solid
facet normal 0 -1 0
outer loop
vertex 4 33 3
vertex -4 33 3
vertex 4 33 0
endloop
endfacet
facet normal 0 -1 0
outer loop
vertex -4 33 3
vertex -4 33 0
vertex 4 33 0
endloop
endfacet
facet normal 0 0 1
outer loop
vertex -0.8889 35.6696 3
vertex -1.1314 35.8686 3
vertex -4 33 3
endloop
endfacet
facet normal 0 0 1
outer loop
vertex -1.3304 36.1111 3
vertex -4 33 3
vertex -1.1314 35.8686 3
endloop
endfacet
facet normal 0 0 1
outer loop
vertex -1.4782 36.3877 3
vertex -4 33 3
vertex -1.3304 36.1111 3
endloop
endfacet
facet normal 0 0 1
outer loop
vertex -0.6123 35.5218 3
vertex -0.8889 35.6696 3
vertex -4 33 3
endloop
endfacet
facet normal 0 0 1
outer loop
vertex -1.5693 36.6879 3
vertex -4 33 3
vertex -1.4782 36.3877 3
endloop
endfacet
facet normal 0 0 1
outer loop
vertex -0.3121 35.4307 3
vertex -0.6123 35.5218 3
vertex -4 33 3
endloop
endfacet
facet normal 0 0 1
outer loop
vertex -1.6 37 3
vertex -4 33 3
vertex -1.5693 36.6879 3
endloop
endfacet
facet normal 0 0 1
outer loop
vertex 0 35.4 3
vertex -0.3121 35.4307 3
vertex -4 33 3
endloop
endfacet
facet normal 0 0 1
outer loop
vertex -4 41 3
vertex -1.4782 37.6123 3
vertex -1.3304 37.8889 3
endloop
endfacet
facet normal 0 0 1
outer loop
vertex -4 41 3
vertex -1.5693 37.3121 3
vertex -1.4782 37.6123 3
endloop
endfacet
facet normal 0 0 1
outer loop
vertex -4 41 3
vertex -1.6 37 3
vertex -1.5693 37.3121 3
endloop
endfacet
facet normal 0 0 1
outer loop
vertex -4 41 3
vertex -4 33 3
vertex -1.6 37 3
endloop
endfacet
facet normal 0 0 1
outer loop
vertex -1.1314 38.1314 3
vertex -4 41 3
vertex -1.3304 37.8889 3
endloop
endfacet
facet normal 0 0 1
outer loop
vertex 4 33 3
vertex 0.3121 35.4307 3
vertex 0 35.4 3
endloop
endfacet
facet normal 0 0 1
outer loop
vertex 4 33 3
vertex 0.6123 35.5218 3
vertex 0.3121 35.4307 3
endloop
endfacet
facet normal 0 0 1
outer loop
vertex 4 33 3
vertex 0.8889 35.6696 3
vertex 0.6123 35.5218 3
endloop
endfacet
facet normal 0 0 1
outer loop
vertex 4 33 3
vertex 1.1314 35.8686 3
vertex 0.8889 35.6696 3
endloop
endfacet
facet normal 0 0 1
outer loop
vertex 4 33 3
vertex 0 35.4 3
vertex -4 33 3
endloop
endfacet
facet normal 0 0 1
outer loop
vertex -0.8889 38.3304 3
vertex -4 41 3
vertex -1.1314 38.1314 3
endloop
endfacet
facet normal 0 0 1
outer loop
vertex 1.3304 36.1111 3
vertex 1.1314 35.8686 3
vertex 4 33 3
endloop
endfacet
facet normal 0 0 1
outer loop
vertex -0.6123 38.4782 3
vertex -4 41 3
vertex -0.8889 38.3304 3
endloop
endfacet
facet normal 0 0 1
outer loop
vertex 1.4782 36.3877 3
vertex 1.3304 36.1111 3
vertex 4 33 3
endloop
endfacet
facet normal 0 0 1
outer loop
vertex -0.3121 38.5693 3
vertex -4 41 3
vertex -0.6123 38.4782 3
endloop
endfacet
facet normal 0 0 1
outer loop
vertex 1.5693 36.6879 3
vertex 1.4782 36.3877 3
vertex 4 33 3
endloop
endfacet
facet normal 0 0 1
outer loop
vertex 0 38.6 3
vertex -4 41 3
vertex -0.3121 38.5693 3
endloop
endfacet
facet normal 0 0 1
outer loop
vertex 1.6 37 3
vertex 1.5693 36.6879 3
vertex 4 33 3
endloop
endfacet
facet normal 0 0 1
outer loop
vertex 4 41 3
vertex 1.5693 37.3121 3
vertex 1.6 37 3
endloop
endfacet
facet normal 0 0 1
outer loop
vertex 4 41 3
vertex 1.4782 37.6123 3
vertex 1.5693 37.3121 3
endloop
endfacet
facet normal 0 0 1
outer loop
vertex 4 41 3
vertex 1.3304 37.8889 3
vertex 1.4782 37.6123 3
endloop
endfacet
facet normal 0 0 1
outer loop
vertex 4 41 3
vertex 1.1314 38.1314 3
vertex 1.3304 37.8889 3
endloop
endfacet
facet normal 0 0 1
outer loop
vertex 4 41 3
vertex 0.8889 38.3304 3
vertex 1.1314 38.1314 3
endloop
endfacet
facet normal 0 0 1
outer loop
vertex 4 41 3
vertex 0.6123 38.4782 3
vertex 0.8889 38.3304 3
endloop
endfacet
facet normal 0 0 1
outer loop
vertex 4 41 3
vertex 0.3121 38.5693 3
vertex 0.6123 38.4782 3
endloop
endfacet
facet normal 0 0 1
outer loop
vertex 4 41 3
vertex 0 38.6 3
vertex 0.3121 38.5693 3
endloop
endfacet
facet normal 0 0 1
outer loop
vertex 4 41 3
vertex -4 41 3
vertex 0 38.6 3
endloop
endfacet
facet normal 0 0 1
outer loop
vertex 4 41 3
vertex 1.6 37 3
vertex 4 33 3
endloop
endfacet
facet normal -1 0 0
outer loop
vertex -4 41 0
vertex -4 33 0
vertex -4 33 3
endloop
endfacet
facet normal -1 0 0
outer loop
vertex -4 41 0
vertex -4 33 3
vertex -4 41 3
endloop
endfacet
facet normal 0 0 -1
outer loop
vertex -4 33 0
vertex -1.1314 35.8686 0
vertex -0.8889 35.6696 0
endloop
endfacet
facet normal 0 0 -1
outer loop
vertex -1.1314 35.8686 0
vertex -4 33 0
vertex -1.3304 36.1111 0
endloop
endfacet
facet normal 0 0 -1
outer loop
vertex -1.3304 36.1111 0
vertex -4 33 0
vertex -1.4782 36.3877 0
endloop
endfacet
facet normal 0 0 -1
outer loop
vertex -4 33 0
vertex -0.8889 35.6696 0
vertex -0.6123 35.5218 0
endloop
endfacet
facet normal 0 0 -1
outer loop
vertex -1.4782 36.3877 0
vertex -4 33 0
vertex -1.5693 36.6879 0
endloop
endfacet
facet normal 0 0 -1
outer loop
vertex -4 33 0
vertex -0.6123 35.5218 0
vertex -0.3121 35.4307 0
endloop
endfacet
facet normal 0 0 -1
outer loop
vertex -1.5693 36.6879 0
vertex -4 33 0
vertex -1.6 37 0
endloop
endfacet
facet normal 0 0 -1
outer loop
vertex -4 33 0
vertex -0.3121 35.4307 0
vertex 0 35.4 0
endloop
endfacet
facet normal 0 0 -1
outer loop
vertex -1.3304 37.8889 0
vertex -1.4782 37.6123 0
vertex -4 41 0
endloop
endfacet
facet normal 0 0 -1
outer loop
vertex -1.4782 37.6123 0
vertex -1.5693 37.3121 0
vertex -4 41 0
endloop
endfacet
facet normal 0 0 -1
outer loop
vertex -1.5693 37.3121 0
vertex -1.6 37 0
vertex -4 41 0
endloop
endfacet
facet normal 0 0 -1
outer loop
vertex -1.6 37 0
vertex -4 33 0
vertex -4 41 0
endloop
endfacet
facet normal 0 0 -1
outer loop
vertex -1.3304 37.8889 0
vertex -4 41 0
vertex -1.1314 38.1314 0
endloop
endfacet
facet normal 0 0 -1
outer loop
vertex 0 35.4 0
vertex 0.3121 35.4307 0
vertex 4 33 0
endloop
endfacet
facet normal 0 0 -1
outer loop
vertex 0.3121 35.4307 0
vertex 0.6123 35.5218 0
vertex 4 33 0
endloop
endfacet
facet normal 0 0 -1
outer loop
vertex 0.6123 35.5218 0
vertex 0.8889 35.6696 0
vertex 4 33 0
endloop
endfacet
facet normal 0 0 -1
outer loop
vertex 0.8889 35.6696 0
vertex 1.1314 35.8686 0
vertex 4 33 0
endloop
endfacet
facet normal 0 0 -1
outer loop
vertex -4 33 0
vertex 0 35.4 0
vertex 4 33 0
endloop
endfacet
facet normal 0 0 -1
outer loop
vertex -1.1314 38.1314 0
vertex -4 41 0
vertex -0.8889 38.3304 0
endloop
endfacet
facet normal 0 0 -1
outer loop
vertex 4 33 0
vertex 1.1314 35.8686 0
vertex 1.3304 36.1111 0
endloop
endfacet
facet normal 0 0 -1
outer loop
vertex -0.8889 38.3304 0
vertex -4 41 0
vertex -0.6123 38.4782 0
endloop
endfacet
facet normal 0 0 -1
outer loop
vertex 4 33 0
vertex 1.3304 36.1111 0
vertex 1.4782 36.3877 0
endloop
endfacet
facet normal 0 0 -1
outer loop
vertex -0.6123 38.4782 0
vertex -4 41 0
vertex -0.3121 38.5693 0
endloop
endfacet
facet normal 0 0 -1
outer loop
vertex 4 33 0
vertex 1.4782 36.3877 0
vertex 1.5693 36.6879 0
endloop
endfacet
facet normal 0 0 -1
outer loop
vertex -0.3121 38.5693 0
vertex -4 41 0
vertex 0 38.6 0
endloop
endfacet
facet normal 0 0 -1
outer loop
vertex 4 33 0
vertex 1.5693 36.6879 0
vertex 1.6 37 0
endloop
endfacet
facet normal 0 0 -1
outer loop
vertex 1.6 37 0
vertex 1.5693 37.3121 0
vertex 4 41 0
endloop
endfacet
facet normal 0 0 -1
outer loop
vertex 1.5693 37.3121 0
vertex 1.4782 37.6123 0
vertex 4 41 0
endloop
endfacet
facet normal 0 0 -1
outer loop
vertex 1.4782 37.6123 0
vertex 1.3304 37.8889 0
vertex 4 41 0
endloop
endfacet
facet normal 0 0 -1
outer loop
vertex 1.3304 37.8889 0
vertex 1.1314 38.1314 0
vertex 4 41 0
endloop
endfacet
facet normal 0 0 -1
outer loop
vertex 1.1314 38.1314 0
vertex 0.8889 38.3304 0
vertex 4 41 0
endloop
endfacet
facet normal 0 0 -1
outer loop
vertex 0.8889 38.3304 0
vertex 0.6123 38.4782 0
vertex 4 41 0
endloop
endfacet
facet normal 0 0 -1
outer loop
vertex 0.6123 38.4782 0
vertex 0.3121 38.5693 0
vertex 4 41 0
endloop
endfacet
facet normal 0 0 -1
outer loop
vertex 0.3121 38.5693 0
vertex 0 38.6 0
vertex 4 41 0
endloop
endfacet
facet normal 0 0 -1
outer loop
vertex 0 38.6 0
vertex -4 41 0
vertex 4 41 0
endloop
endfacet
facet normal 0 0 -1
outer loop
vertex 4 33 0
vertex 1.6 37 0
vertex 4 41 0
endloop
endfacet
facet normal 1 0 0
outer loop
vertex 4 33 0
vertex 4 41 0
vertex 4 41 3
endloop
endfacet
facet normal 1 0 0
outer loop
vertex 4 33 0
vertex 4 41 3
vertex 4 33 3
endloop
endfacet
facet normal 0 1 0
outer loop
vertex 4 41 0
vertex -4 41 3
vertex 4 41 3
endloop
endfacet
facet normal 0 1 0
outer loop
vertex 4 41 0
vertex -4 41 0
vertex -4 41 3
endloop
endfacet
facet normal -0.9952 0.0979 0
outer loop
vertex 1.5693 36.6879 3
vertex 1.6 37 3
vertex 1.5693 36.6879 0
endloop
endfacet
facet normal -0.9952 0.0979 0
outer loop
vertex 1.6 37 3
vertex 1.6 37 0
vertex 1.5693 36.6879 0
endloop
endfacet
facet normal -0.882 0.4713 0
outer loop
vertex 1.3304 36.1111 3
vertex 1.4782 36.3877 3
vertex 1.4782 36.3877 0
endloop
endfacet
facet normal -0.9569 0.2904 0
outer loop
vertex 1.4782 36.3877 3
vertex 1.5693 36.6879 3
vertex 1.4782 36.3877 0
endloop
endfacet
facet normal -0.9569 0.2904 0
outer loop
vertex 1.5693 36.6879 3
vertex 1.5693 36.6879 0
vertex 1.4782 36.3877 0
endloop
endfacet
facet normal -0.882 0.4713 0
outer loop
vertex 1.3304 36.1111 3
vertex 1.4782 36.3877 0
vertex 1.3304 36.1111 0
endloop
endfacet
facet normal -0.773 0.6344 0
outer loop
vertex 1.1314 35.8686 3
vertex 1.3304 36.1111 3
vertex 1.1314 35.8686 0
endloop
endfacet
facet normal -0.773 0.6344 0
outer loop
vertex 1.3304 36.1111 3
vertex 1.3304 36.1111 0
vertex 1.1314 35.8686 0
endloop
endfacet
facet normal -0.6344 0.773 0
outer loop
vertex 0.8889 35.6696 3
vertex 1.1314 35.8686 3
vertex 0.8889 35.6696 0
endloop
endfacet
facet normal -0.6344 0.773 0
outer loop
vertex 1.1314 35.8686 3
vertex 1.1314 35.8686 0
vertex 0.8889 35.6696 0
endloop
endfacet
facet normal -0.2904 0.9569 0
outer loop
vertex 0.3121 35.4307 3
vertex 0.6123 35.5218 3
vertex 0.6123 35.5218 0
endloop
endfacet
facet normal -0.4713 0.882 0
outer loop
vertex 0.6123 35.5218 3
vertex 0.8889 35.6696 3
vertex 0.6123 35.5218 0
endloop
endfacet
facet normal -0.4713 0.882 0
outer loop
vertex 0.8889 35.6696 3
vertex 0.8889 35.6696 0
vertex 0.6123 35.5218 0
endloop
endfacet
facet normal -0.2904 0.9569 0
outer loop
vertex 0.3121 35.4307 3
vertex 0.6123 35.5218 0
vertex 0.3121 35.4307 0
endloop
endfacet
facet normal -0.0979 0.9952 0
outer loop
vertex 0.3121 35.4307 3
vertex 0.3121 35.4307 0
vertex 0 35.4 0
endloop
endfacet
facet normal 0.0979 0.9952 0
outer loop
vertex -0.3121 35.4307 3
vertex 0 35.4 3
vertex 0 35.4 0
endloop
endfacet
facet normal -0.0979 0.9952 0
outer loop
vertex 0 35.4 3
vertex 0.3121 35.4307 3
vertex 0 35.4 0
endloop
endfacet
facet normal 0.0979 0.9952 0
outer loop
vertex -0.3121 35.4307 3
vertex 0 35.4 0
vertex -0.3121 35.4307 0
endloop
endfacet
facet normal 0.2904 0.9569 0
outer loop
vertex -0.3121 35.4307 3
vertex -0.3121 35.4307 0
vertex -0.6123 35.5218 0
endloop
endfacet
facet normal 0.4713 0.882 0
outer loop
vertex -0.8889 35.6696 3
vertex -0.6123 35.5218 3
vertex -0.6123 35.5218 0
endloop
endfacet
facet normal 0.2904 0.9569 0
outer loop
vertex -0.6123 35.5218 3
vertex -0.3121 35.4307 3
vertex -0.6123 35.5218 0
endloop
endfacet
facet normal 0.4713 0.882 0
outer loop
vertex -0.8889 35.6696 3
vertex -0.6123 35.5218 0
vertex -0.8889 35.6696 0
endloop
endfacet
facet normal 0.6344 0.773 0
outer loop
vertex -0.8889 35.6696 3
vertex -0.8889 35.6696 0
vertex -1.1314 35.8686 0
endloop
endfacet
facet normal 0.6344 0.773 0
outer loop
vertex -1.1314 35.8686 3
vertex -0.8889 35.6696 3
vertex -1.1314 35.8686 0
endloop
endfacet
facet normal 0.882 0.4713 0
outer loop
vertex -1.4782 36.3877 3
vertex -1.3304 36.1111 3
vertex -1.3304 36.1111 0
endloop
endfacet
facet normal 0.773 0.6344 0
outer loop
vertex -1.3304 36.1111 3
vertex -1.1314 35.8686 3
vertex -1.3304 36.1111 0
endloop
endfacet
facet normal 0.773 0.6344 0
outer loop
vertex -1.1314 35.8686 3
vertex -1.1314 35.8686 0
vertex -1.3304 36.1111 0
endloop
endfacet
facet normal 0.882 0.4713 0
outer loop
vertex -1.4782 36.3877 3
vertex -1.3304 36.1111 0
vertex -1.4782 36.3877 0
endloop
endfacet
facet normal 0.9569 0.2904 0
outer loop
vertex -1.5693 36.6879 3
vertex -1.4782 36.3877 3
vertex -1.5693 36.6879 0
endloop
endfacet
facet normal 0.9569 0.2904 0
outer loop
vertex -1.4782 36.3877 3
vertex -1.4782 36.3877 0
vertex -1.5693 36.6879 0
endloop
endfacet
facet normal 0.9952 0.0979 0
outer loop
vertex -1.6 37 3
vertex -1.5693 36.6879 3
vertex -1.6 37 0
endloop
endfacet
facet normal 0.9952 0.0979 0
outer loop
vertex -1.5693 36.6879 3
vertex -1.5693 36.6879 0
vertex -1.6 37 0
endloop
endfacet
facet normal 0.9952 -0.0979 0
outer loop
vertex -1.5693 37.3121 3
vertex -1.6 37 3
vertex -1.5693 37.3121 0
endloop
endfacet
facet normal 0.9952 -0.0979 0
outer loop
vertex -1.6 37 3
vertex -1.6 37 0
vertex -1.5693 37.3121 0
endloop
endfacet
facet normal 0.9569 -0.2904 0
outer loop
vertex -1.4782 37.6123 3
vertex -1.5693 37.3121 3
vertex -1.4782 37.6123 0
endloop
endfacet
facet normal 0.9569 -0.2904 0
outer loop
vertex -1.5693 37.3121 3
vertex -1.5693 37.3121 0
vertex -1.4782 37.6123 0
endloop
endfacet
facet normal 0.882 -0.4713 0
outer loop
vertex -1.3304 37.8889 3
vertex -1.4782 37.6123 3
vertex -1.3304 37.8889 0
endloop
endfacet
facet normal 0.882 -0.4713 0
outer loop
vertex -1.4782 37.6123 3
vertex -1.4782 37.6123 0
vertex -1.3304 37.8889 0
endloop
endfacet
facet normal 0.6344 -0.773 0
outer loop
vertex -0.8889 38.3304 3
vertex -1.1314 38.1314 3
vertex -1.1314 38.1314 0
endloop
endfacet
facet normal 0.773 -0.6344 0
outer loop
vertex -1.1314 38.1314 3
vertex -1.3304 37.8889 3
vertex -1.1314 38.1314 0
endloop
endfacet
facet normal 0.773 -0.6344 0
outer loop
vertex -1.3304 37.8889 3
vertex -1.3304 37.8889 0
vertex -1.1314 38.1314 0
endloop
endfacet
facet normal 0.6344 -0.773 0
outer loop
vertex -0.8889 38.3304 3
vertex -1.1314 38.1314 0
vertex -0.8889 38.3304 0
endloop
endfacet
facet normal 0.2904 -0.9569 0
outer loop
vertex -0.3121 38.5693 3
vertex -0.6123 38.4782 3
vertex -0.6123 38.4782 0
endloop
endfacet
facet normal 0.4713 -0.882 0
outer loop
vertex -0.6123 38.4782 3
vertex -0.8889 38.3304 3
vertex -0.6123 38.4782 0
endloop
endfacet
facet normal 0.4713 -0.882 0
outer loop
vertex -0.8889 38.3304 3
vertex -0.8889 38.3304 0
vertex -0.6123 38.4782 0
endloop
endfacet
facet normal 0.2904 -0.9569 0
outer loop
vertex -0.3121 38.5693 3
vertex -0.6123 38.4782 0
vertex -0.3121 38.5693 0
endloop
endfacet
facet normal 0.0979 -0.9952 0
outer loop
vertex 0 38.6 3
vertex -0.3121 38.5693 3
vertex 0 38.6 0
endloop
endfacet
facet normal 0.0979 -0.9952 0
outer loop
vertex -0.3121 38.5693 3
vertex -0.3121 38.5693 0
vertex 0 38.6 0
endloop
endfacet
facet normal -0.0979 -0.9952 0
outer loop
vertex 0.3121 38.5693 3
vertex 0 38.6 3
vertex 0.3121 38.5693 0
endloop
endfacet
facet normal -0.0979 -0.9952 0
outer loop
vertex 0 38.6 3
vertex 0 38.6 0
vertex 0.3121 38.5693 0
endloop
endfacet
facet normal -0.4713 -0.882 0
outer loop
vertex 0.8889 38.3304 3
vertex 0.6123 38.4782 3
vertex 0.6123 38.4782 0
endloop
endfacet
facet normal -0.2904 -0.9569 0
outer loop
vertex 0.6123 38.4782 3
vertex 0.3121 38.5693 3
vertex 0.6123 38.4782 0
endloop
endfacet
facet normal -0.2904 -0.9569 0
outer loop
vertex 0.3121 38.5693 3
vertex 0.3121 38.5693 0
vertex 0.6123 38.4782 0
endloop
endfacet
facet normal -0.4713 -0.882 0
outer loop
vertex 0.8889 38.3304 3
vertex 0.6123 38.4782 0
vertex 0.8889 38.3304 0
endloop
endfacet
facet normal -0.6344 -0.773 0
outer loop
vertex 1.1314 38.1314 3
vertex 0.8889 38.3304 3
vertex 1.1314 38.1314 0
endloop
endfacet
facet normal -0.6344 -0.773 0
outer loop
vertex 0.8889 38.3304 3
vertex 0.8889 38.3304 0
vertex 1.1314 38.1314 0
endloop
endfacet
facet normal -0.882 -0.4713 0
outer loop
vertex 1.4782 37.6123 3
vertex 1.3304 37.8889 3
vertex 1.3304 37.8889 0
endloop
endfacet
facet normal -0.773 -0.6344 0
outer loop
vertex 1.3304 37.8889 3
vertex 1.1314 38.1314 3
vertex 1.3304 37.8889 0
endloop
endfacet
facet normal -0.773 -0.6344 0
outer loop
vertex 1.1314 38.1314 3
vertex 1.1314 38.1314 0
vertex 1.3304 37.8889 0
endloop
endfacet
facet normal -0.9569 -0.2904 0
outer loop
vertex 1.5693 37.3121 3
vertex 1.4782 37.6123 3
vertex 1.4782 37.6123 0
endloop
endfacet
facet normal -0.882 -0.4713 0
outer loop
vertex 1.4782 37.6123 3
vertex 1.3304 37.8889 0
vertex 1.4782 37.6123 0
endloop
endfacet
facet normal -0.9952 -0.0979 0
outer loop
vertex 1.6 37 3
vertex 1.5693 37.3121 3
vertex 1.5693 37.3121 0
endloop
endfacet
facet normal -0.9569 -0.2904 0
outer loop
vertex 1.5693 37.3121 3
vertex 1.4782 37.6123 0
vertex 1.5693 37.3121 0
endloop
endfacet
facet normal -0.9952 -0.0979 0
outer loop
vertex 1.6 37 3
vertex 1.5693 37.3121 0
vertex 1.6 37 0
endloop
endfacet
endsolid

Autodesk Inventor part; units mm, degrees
ref_plane "YZ Plane" through (0, 0, 0) normal (1, 0, 0) x (0, 1, 0)
ref_plane "XZ Plane" through (0, 0, 0) normal (0, 1, 0) x (-1, 0, 0)
sketch "Boceto1" plane through (0, 0, 0) normal (0, 0, 1) x (1, 0, 0)
  circle A0 centre (0, 37) radius 2.1
  circle A1 centre (0, -37) radius 2.1
  line L0 (4, 41) -> (4, -41)
  line L1 (-4, 41) -> (4, 41)
  line L2 (-4, -41) -> (-4, 41)
  line L3 (4, -41) -> (-4, -41)
  line L4 (4, 41) -> (-4, 41)
  line L5 (-4, 41) -> (-4, 33)
  line L6 (-4, 33) -> (4, 33)
  line L7 (4, 33) -> (4, 41)
  circle A2 centre (0, 37) radius 1.6
  line L8 (0, 0) -> (0, 33)
  line L9 (4, 33) -> (-4, 33)
  line L10 (-4, 33) -> (-4, 23)
  line L11 (-4, 23) -> (4, 23)
  line L12 (4, 23) -> (4, 33)
  dimension "d2" = 3.2
ref_plane "Plano de trabajo1" through (-9.1, 23, 5.1) normal (0, 0, 1) x (1, 0, 0)
extrude "Extrusión1" add sketch "Boceto1" along normal blind 3 contours A0 | L0 L6 L2 L1
properties part number "Soporte gomas"
